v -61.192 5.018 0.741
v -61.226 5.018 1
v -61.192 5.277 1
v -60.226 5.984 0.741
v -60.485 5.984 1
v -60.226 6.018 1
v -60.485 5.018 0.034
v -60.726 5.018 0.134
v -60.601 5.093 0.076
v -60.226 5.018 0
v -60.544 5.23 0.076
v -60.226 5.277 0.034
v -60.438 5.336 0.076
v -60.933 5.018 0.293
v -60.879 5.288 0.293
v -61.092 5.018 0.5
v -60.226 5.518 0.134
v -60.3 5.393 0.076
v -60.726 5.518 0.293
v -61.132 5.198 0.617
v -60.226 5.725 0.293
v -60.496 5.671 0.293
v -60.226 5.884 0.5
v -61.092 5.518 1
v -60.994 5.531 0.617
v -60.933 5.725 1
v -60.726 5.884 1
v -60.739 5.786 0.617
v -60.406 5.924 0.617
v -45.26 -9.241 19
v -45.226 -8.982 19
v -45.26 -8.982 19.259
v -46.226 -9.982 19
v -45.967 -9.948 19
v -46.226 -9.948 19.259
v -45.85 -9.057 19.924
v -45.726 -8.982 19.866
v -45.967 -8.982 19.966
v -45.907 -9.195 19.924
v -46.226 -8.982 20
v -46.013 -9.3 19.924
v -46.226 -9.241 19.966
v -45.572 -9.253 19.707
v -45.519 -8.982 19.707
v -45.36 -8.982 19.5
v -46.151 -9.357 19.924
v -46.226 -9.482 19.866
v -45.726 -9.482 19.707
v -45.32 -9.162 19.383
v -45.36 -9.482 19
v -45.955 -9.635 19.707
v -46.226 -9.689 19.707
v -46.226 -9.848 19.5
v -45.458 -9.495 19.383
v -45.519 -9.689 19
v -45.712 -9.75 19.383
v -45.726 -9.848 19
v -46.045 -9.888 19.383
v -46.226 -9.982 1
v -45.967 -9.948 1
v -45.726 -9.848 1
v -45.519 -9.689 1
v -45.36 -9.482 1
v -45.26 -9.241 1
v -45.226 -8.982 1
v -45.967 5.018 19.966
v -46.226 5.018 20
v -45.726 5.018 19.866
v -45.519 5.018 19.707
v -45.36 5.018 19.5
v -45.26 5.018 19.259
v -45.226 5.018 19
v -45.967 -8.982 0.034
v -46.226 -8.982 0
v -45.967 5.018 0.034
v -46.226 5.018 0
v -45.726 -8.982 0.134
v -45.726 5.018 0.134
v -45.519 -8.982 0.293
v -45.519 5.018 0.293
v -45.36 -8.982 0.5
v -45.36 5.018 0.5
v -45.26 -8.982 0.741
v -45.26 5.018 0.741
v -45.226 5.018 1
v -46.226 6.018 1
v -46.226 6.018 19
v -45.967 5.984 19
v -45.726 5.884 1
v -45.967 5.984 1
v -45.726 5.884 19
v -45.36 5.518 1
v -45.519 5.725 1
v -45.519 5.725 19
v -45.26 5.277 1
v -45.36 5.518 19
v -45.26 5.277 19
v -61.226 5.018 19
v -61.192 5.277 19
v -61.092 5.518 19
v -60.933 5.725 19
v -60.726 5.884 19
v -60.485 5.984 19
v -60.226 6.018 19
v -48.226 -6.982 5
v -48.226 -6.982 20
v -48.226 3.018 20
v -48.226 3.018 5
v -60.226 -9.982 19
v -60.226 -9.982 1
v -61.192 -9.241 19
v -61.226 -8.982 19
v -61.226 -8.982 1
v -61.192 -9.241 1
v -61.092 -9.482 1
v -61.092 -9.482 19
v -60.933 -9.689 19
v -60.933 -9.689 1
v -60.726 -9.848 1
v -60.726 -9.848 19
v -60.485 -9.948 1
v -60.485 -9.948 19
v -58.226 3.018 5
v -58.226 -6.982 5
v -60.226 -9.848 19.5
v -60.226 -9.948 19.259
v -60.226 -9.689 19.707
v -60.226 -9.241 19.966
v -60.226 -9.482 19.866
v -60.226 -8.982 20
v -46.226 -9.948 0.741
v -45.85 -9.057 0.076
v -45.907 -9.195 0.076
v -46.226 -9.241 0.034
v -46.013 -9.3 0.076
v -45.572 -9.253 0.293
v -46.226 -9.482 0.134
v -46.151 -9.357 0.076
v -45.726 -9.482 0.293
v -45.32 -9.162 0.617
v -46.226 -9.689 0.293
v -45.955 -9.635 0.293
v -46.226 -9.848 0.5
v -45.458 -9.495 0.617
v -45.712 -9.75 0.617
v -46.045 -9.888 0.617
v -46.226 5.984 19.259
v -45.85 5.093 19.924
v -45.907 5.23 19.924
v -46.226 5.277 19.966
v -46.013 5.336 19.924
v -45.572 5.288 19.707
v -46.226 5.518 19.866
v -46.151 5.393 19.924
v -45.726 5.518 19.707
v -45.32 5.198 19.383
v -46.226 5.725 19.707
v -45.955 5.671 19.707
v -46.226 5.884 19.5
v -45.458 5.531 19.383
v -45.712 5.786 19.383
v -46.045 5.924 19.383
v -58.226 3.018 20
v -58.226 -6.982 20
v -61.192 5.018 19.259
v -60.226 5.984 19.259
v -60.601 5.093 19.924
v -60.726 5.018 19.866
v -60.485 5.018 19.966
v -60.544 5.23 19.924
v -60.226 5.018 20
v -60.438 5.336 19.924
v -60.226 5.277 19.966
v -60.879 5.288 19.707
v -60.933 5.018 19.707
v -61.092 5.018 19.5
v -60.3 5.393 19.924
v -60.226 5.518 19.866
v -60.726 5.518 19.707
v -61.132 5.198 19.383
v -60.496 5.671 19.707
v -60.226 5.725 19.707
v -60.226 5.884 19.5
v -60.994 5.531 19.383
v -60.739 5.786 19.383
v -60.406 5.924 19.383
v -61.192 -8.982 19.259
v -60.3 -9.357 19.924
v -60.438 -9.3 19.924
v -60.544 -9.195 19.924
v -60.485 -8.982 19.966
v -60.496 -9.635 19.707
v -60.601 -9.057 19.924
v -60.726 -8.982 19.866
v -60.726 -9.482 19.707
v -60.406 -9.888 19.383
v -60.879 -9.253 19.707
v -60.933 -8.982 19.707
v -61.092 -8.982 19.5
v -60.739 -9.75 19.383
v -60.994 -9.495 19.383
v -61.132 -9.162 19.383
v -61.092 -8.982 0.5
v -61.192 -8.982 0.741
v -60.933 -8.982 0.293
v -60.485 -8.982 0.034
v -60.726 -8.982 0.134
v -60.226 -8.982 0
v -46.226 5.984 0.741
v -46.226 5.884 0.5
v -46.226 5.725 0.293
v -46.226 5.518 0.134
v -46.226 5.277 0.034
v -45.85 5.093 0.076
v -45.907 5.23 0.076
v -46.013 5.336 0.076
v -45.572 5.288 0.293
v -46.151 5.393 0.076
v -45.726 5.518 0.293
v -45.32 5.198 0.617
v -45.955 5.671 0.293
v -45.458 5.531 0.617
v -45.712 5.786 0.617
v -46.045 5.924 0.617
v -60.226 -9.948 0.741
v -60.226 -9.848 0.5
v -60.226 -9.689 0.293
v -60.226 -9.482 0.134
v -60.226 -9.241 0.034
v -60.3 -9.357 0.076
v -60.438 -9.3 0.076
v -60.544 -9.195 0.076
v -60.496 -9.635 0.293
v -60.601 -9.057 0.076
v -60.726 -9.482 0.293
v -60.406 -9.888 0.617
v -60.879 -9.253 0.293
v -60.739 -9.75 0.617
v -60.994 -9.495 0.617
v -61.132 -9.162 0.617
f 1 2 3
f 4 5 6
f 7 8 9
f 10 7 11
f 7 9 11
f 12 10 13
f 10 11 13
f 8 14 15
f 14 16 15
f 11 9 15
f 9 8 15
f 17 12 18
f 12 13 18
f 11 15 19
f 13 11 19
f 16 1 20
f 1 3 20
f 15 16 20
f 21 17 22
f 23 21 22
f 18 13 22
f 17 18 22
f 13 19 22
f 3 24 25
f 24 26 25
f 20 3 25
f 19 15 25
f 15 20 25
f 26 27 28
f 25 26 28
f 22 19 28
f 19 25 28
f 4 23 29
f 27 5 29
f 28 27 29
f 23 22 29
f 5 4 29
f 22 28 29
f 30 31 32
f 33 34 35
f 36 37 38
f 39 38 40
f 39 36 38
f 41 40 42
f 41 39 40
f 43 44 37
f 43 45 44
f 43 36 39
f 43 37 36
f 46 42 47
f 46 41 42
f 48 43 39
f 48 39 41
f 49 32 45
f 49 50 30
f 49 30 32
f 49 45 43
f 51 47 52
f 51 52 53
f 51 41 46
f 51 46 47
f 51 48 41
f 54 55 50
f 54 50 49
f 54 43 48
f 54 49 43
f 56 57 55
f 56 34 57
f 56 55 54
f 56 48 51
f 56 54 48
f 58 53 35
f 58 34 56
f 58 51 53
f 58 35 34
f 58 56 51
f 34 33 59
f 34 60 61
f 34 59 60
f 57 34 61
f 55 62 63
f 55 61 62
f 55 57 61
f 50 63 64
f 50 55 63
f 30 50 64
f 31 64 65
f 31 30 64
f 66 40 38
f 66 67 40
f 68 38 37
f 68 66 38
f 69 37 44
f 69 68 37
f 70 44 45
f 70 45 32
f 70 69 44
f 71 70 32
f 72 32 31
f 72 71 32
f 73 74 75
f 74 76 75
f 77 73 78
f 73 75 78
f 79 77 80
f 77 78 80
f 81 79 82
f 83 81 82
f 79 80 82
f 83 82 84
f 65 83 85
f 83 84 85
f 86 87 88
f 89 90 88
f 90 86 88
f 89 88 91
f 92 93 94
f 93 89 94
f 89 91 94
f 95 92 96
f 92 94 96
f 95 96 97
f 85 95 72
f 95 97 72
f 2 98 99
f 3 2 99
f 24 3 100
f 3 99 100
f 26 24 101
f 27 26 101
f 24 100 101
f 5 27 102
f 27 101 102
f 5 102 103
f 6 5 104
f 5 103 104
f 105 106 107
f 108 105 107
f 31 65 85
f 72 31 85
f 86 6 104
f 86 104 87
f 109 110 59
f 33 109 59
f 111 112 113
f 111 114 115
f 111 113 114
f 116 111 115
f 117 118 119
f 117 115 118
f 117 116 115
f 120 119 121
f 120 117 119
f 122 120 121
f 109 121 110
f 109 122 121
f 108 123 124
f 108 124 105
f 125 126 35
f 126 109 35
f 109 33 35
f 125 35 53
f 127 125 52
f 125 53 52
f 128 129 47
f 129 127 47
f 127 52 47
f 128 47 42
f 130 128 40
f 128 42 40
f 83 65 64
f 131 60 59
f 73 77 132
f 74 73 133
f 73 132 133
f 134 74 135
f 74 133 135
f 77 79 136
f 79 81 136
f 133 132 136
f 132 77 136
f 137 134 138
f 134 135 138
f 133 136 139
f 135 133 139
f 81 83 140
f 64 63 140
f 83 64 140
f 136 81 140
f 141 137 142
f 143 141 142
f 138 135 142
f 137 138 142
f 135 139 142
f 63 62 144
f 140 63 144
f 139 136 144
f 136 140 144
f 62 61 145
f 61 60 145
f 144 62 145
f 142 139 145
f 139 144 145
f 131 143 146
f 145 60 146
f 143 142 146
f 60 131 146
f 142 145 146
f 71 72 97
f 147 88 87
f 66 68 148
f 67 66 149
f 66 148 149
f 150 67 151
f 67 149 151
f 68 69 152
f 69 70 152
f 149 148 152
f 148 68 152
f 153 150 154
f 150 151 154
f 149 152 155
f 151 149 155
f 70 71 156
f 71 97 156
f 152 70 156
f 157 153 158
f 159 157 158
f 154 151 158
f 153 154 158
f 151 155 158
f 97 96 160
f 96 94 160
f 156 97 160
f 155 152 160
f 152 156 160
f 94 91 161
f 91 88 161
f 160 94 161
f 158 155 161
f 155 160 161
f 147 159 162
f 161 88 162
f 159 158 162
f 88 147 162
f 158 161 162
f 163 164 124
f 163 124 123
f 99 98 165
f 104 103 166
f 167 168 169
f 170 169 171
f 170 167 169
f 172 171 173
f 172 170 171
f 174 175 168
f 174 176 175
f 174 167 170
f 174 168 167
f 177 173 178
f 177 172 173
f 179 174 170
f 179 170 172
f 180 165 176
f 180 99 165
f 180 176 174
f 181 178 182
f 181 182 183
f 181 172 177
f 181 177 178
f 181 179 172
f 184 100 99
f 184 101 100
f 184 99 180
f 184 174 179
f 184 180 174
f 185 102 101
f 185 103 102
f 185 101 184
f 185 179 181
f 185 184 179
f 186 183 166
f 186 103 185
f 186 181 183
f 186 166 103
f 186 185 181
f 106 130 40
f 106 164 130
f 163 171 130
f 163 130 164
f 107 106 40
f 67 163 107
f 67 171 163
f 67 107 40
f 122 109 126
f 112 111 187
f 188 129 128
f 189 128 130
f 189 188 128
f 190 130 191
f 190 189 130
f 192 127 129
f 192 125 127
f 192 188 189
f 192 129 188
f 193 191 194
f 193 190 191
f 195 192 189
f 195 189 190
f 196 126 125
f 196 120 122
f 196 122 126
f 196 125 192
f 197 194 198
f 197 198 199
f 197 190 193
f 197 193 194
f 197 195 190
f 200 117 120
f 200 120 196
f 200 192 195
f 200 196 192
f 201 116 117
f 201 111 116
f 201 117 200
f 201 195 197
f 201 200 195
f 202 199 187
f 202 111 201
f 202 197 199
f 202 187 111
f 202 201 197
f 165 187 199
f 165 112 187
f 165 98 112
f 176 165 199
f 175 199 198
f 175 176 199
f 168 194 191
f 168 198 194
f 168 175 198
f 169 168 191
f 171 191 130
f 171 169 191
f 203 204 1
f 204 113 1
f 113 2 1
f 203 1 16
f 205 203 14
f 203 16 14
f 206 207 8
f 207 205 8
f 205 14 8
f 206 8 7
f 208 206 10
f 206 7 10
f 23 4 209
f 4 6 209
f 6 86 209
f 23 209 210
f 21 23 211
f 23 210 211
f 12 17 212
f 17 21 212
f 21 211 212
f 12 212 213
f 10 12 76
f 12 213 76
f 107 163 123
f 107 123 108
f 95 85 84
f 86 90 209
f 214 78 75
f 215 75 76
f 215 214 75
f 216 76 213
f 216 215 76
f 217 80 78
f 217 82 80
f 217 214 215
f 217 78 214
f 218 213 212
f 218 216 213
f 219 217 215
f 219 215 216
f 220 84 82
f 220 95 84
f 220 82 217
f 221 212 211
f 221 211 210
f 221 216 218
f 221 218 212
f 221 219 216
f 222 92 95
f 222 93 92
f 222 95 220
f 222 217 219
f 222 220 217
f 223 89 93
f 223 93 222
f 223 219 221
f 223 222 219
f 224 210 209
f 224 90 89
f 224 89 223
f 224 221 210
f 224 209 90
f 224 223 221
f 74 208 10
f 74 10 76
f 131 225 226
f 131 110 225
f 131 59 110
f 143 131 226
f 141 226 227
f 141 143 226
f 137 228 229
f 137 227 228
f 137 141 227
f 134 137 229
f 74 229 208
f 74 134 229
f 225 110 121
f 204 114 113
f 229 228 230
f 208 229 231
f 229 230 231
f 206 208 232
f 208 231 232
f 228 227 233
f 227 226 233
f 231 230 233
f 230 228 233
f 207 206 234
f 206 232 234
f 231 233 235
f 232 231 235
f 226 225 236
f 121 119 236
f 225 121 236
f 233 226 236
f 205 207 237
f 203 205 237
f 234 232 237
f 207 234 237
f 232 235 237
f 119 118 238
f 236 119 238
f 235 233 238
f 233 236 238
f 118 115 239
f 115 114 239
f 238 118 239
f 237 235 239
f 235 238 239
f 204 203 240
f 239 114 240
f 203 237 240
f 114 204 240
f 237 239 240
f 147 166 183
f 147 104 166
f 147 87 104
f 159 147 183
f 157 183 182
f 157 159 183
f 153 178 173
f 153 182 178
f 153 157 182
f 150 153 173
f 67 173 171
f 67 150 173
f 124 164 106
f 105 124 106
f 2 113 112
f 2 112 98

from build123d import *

# Parameters (mm, degrees)
F0_W     = 16
F0_H     = 16
F1_DEPTH = 20
F2_W     = 10
F2_H     = 10
F3_DEPTH = 15
F4_R     = 1


with BuildPart() as f1:
    # F0 (on Top) → F1 (new body)
    with BuildSketch(Plane.XY):
        with Locations((-53.225686, -1.982133)):
            Rectangle(F0_W, F0_H)
    extrude(amount=F1_DEPTH)

    # F2 (on face) → F3 (cut)
    with BuildSketch(Plane.XY.offset(20)):
        with Locations((-53.225686, -1.982133)):
            Rectangle(F2_W, F2_H)
    extrude(amount=-F3_DEPTH, mode=Mode.SUBTRACT)

    # F4
    f4_edges = [f1.edges().sort_by_distance(p)[0] for p in [
        (-45.225686, -9.982133, 10),
        (-45.225686, 6.017867, 10),
        (-45.225686, -1.982133, 0),
        (-45.225686, -1.982133, 20),
        (-61.225686, -9.982133, 10),
        (-53.225686, -9.982133, 0),
        (-53.225686, -9.982133, 20),
        (-61.225686, 6.017867, 10),
        (-61.225686, -1.982133, 0),
        (-61.225686, -1.982133, 20),
        (-53.225686, 6.017867, 0),
        (-53.225686, 6.017867, 20),
    ]]
    fillet(f4_edges, radius=F4_R)


solid = f1.part
